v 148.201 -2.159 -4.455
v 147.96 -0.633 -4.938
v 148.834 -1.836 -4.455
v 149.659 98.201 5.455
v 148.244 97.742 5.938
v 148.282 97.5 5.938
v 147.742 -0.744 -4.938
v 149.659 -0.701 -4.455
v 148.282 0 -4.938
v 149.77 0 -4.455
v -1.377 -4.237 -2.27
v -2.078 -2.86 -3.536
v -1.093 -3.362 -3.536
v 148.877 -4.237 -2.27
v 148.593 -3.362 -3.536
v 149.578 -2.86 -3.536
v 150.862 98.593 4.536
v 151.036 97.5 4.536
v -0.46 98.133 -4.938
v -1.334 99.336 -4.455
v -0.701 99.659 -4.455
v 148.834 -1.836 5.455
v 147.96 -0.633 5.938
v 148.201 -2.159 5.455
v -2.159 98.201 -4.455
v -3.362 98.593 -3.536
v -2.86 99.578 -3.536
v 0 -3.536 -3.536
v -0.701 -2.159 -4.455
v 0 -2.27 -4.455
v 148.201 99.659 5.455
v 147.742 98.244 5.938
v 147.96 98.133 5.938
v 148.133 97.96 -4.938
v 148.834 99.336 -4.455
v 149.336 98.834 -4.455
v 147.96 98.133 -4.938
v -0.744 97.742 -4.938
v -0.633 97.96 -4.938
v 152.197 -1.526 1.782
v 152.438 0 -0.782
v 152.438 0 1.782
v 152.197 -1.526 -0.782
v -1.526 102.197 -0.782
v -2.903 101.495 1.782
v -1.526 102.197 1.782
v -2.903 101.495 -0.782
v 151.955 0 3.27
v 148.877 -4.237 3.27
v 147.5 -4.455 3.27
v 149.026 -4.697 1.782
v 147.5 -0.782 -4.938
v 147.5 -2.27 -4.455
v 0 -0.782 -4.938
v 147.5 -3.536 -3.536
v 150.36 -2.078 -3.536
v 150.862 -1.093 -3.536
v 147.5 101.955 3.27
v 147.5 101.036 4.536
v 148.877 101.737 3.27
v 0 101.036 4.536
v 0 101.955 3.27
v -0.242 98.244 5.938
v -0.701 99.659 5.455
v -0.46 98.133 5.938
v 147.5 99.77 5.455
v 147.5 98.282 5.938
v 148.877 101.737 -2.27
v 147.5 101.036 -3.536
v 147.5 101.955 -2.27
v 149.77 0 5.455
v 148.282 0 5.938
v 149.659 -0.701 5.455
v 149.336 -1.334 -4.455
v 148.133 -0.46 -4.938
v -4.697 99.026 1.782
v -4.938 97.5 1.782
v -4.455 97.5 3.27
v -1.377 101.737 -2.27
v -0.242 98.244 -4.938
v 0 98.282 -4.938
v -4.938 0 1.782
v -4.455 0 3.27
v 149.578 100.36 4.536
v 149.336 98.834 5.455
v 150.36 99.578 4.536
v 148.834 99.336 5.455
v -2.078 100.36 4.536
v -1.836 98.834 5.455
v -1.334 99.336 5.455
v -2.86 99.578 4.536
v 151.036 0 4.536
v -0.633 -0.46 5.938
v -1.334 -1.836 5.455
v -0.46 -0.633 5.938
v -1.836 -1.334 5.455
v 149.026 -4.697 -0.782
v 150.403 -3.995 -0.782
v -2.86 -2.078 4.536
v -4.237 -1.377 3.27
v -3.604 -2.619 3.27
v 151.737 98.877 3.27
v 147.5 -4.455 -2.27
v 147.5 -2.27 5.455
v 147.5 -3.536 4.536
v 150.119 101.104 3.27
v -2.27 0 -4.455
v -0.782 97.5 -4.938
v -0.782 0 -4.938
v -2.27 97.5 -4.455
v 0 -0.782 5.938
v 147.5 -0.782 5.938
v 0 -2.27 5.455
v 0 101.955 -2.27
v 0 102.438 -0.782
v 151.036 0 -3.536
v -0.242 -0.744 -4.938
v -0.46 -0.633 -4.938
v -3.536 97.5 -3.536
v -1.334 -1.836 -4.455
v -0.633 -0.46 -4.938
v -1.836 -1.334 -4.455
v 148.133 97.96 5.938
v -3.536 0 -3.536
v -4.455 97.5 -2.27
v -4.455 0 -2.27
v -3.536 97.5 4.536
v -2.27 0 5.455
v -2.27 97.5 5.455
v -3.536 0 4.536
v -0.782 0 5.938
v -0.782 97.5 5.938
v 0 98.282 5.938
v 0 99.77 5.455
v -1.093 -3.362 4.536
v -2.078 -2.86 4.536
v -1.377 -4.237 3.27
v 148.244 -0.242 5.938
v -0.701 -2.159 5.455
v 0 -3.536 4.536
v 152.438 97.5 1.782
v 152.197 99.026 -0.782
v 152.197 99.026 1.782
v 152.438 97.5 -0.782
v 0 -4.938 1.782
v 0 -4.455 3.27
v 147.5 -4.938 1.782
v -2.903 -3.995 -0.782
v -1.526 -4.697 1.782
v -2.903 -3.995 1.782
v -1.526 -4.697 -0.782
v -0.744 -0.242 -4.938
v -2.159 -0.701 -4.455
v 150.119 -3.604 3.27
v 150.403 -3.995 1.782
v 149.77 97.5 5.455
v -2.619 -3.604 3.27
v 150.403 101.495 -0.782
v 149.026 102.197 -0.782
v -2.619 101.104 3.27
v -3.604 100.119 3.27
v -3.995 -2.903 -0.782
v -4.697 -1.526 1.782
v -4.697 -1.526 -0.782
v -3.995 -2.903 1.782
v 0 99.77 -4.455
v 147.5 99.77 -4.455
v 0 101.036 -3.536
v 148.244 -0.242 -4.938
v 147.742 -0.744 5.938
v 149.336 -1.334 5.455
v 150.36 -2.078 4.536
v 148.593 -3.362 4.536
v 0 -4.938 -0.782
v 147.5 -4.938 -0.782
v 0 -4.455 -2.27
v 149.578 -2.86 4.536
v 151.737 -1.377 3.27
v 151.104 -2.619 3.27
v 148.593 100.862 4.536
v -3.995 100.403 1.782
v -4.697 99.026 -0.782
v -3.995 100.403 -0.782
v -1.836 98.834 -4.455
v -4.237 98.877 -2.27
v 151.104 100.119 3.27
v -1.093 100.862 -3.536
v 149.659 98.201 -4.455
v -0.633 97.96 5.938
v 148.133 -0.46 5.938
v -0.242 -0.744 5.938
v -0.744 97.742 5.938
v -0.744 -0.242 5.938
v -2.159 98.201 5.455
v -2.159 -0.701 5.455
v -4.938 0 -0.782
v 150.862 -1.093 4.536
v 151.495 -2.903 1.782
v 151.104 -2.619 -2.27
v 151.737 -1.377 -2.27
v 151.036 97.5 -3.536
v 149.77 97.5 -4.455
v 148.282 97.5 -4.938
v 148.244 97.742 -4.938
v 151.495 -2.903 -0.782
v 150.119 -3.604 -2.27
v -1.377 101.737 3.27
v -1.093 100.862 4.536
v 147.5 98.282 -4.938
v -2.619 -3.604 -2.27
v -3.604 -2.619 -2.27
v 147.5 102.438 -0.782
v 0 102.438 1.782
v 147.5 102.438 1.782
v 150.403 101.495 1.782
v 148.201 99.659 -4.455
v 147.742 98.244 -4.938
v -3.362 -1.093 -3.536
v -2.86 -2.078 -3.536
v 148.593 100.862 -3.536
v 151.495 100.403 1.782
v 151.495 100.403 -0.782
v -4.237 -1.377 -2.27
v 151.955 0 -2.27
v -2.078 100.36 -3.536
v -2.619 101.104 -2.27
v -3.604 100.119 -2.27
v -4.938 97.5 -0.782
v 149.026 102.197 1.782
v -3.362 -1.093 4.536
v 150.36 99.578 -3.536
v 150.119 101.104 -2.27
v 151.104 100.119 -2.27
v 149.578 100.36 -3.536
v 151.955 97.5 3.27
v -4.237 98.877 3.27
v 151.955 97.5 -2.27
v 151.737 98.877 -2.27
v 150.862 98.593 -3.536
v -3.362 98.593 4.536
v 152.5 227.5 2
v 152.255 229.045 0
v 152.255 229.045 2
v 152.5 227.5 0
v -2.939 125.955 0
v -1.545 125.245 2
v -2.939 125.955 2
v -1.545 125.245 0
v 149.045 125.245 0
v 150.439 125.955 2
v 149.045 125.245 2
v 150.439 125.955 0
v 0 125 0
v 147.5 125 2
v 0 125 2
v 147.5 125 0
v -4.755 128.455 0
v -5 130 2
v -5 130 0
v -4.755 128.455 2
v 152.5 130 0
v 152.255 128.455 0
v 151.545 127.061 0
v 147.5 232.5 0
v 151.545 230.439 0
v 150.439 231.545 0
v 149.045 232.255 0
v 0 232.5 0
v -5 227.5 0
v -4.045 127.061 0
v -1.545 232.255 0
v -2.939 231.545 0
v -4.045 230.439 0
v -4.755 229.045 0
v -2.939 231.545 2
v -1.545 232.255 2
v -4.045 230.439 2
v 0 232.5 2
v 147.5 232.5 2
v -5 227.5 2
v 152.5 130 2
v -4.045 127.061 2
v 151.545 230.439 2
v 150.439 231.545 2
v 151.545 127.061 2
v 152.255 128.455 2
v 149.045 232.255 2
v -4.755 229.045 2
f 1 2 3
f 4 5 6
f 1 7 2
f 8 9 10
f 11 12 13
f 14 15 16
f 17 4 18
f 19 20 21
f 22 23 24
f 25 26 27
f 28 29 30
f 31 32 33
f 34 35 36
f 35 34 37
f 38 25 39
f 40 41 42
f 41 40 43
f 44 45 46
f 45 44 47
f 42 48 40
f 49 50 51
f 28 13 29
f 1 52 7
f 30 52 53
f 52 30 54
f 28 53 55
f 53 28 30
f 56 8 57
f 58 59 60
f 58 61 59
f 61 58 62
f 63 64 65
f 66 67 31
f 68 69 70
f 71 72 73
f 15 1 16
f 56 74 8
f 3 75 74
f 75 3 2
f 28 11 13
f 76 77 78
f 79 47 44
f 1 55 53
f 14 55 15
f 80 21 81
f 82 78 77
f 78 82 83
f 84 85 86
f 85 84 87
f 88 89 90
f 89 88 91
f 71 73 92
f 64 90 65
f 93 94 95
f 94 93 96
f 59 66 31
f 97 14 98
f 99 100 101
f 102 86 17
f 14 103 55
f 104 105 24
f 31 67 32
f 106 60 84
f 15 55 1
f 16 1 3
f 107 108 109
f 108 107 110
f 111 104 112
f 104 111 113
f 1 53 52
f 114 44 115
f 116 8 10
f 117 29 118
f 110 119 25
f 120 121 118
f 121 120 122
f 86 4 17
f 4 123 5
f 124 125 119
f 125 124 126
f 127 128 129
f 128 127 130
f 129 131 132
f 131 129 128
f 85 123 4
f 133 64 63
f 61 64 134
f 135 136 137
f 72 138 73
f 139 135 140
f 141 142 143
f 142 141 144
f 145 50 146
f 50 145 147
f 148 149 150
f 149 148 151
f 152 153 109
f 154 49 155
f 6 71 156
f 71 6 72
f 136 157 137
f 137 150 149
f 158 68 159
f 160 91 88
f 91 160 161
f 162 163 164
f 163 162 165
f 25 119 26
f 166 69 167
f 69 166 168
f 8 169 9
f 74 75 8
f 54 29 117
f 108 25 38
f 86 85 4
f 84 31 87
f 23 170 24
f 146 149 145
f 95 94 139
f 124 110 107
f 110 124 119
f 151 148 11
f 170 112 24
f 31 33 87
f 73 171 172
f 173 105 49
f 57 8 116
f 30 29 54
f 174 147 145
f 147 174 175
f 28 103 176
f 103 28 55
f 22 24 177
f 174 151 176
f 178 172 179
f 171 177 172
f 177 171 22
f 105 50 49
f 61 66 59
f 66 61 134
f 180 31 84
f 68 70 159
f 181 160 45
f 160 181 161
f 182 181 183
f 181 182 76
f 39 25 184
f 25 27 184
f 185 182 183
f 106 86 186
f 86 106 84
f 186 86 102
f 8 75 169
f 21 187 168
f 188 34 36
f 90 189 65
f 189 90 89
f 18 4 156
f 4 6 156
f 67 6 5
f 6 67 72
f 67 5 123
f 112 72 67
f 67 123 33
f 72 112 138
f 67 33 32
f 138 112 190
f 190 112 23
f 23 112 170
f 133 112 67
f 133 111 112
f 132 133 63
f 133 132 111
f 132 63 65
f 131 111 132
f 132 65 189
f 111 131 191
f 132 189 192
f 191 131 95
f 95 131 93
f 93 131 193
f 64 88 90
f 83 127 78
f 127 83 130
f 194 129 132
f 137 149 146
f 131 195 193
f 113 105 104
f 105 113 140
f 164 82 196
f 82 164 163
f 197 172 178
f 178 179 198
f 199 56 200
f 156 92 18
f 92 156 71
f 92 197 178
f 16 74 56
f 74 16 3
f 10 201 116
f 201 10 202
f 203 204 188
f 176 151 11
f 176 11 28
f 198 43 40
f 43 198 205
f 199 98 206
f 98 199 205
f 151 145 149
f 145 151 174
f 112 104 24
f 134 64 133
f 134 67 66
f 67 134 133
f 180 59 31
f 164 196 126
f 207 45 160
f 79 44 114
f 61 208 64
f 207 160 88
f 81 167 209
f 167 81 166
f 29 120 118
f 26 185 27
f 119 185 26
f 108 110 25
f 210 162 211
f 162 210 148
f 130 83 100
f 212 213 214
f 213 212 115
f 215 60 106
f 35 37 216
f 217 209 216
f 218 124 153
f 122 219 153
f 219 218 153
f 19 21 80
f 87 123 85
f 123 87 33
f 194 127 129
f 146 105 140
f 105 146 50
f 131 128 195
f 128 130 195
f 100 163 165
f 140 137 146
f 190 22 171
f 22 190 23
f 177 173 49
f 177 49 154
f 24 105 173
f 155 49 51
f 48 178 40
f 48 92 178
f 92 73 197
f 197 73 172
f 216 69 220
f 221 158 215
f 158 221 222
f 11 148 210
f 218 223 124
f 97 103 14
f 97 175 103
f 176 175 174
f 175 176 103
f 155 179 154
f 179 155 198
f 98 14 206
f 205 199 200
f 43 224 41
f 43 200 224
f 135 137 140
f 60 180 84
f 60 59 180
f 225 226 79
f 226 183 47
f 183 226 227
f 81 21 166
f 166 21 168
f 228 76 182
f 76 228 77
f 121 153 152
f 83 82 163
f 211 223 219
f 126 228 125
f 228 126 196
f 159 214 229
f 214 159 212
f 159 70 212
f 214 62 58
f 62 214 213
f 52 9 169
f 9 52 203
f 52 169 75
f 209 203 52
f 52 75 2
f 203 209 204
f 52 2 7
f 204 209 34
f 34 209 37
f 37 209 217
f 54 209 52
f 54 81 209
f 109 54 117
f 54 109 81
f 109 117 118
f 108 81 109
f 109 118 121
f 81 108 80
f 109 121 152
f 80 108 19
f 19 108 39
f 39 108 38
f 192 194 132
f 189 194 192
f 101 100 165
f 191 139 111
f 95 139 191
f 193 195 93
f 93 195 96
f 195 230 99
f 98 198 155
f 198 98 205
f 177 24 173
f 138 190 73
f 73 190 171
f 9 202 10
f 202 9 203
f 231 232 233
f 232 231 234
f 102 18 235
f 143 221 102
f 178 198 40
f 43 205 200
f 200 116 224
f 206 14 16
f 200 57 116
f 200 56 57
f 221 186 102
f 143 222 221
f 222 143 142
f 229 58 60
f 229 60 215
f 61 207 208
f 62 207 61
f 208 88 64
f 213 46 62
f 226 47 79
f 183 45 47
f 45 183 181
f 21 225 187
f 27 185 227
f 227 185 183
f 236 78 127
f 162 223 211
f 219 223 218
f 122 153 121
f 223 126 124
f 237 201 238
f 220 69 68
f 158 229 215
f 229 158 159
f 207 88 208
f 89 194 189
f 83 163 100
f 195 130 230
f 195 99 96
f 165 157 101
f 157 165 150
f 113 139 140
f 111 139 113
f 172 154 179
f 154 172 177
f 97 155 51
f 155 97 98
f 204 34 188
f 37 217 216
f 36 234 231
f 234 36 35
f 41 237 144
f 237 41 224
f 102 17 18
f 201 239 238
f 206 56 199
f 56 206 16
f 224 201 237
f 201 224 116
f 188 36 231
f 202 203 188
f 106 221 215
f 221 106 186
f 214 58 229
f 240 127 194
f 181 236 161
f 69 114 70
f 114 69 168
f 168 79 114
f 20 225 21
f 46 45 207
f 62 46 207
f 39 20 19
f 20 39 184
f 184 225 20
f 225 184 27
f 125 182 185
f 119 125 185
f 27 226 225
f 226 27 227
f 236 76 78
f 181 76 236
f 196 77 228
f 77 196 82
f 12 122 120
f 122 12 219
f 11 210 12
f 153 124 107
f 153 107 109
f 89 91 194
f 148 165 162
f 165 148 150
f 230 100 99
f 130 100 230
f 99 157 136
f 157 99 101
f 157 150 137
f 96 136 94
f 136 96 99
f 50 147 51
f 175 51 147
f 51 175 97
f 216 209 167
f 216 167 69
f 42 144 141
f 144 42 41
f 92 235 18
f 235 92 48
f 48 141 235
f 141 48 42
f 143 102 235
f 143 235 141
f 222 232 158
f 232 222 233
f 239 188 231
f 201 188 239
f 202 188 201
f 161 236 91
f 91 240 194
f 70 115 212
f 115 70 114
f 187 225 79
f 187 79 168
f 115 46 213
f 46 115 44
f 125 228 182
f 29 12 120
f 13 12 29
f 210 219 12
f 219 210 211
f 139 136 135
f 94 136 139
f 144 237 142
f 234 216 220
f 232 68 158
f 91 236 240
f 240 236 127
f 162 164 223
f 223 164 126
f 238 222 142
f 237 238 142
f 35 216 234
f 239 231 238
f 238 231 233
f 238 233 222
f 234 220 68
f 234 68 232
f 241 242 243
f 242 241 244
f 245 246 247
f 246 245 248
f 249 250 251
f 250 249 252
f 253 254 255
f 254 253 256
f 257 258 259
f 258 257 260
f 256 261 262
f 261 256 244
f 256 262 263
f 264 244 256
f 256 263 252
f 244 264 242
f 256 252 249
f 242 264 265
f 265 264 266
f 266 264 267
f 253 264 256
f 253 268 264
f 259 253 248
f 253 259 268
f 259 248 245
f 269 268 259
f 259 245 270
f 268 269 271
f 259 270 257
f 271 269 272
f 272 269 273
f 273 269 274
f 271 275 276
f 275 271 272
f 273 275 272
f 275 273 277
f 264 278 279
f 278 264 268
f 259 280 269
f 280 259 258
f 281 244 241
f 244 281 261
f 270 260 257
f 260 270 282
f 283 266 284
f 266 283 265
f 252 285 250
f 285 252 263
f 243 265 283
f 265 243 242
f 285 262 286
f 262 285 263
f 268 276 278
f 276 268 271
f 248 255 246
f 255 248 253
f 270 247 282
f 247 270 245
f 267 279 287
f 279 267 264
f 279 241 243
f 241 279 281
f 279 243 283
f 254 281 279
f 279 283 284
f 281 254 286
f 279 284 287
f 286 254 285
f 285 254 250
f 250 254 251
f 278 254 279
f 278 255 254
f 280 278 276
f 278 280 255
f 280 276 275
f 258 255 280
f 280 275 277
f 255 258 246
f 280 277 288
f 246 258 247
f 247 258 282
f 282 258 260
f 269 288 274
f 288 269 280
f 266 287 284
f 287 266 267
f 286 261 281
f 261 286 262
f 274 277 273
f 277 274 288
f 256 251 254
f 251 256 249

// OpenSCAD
/**
 * 
 *  some parts of this software were inspired by 
 *   	
 * 	     http://www.thingiverse.com/thing:9347
 * 
 */
 
boardLength = 150;
boardWidth = 100;

roundedCube([boardLength, boardWidth, 1], 5, sides=20);

translate([0, 130, 0])
roundedCube([boardLength, boardWidth, 1], 5, sides=20, sidesOnly=true);

/**
 * makes a rounded cube
 */
module roundedCube(size, cornerRadius, sides=30, sidesOnly=false)
{
	$fn=sides;
	
	x = size[0] - cornerRadius/2;
	y = size[1] - cornerRadius/2;
	z = size[2];
	
	minkowski(size, cornerRadius)
	{
	    cube(size=[x,y,z]);
	    
	    if(sidesOnly)
	    {
	    	cylinder(r=cornerRadius);
	    }
	    else
	    {
	    	sphere(r=cornerRadius);
	    	
    	}
	}	
}
 
